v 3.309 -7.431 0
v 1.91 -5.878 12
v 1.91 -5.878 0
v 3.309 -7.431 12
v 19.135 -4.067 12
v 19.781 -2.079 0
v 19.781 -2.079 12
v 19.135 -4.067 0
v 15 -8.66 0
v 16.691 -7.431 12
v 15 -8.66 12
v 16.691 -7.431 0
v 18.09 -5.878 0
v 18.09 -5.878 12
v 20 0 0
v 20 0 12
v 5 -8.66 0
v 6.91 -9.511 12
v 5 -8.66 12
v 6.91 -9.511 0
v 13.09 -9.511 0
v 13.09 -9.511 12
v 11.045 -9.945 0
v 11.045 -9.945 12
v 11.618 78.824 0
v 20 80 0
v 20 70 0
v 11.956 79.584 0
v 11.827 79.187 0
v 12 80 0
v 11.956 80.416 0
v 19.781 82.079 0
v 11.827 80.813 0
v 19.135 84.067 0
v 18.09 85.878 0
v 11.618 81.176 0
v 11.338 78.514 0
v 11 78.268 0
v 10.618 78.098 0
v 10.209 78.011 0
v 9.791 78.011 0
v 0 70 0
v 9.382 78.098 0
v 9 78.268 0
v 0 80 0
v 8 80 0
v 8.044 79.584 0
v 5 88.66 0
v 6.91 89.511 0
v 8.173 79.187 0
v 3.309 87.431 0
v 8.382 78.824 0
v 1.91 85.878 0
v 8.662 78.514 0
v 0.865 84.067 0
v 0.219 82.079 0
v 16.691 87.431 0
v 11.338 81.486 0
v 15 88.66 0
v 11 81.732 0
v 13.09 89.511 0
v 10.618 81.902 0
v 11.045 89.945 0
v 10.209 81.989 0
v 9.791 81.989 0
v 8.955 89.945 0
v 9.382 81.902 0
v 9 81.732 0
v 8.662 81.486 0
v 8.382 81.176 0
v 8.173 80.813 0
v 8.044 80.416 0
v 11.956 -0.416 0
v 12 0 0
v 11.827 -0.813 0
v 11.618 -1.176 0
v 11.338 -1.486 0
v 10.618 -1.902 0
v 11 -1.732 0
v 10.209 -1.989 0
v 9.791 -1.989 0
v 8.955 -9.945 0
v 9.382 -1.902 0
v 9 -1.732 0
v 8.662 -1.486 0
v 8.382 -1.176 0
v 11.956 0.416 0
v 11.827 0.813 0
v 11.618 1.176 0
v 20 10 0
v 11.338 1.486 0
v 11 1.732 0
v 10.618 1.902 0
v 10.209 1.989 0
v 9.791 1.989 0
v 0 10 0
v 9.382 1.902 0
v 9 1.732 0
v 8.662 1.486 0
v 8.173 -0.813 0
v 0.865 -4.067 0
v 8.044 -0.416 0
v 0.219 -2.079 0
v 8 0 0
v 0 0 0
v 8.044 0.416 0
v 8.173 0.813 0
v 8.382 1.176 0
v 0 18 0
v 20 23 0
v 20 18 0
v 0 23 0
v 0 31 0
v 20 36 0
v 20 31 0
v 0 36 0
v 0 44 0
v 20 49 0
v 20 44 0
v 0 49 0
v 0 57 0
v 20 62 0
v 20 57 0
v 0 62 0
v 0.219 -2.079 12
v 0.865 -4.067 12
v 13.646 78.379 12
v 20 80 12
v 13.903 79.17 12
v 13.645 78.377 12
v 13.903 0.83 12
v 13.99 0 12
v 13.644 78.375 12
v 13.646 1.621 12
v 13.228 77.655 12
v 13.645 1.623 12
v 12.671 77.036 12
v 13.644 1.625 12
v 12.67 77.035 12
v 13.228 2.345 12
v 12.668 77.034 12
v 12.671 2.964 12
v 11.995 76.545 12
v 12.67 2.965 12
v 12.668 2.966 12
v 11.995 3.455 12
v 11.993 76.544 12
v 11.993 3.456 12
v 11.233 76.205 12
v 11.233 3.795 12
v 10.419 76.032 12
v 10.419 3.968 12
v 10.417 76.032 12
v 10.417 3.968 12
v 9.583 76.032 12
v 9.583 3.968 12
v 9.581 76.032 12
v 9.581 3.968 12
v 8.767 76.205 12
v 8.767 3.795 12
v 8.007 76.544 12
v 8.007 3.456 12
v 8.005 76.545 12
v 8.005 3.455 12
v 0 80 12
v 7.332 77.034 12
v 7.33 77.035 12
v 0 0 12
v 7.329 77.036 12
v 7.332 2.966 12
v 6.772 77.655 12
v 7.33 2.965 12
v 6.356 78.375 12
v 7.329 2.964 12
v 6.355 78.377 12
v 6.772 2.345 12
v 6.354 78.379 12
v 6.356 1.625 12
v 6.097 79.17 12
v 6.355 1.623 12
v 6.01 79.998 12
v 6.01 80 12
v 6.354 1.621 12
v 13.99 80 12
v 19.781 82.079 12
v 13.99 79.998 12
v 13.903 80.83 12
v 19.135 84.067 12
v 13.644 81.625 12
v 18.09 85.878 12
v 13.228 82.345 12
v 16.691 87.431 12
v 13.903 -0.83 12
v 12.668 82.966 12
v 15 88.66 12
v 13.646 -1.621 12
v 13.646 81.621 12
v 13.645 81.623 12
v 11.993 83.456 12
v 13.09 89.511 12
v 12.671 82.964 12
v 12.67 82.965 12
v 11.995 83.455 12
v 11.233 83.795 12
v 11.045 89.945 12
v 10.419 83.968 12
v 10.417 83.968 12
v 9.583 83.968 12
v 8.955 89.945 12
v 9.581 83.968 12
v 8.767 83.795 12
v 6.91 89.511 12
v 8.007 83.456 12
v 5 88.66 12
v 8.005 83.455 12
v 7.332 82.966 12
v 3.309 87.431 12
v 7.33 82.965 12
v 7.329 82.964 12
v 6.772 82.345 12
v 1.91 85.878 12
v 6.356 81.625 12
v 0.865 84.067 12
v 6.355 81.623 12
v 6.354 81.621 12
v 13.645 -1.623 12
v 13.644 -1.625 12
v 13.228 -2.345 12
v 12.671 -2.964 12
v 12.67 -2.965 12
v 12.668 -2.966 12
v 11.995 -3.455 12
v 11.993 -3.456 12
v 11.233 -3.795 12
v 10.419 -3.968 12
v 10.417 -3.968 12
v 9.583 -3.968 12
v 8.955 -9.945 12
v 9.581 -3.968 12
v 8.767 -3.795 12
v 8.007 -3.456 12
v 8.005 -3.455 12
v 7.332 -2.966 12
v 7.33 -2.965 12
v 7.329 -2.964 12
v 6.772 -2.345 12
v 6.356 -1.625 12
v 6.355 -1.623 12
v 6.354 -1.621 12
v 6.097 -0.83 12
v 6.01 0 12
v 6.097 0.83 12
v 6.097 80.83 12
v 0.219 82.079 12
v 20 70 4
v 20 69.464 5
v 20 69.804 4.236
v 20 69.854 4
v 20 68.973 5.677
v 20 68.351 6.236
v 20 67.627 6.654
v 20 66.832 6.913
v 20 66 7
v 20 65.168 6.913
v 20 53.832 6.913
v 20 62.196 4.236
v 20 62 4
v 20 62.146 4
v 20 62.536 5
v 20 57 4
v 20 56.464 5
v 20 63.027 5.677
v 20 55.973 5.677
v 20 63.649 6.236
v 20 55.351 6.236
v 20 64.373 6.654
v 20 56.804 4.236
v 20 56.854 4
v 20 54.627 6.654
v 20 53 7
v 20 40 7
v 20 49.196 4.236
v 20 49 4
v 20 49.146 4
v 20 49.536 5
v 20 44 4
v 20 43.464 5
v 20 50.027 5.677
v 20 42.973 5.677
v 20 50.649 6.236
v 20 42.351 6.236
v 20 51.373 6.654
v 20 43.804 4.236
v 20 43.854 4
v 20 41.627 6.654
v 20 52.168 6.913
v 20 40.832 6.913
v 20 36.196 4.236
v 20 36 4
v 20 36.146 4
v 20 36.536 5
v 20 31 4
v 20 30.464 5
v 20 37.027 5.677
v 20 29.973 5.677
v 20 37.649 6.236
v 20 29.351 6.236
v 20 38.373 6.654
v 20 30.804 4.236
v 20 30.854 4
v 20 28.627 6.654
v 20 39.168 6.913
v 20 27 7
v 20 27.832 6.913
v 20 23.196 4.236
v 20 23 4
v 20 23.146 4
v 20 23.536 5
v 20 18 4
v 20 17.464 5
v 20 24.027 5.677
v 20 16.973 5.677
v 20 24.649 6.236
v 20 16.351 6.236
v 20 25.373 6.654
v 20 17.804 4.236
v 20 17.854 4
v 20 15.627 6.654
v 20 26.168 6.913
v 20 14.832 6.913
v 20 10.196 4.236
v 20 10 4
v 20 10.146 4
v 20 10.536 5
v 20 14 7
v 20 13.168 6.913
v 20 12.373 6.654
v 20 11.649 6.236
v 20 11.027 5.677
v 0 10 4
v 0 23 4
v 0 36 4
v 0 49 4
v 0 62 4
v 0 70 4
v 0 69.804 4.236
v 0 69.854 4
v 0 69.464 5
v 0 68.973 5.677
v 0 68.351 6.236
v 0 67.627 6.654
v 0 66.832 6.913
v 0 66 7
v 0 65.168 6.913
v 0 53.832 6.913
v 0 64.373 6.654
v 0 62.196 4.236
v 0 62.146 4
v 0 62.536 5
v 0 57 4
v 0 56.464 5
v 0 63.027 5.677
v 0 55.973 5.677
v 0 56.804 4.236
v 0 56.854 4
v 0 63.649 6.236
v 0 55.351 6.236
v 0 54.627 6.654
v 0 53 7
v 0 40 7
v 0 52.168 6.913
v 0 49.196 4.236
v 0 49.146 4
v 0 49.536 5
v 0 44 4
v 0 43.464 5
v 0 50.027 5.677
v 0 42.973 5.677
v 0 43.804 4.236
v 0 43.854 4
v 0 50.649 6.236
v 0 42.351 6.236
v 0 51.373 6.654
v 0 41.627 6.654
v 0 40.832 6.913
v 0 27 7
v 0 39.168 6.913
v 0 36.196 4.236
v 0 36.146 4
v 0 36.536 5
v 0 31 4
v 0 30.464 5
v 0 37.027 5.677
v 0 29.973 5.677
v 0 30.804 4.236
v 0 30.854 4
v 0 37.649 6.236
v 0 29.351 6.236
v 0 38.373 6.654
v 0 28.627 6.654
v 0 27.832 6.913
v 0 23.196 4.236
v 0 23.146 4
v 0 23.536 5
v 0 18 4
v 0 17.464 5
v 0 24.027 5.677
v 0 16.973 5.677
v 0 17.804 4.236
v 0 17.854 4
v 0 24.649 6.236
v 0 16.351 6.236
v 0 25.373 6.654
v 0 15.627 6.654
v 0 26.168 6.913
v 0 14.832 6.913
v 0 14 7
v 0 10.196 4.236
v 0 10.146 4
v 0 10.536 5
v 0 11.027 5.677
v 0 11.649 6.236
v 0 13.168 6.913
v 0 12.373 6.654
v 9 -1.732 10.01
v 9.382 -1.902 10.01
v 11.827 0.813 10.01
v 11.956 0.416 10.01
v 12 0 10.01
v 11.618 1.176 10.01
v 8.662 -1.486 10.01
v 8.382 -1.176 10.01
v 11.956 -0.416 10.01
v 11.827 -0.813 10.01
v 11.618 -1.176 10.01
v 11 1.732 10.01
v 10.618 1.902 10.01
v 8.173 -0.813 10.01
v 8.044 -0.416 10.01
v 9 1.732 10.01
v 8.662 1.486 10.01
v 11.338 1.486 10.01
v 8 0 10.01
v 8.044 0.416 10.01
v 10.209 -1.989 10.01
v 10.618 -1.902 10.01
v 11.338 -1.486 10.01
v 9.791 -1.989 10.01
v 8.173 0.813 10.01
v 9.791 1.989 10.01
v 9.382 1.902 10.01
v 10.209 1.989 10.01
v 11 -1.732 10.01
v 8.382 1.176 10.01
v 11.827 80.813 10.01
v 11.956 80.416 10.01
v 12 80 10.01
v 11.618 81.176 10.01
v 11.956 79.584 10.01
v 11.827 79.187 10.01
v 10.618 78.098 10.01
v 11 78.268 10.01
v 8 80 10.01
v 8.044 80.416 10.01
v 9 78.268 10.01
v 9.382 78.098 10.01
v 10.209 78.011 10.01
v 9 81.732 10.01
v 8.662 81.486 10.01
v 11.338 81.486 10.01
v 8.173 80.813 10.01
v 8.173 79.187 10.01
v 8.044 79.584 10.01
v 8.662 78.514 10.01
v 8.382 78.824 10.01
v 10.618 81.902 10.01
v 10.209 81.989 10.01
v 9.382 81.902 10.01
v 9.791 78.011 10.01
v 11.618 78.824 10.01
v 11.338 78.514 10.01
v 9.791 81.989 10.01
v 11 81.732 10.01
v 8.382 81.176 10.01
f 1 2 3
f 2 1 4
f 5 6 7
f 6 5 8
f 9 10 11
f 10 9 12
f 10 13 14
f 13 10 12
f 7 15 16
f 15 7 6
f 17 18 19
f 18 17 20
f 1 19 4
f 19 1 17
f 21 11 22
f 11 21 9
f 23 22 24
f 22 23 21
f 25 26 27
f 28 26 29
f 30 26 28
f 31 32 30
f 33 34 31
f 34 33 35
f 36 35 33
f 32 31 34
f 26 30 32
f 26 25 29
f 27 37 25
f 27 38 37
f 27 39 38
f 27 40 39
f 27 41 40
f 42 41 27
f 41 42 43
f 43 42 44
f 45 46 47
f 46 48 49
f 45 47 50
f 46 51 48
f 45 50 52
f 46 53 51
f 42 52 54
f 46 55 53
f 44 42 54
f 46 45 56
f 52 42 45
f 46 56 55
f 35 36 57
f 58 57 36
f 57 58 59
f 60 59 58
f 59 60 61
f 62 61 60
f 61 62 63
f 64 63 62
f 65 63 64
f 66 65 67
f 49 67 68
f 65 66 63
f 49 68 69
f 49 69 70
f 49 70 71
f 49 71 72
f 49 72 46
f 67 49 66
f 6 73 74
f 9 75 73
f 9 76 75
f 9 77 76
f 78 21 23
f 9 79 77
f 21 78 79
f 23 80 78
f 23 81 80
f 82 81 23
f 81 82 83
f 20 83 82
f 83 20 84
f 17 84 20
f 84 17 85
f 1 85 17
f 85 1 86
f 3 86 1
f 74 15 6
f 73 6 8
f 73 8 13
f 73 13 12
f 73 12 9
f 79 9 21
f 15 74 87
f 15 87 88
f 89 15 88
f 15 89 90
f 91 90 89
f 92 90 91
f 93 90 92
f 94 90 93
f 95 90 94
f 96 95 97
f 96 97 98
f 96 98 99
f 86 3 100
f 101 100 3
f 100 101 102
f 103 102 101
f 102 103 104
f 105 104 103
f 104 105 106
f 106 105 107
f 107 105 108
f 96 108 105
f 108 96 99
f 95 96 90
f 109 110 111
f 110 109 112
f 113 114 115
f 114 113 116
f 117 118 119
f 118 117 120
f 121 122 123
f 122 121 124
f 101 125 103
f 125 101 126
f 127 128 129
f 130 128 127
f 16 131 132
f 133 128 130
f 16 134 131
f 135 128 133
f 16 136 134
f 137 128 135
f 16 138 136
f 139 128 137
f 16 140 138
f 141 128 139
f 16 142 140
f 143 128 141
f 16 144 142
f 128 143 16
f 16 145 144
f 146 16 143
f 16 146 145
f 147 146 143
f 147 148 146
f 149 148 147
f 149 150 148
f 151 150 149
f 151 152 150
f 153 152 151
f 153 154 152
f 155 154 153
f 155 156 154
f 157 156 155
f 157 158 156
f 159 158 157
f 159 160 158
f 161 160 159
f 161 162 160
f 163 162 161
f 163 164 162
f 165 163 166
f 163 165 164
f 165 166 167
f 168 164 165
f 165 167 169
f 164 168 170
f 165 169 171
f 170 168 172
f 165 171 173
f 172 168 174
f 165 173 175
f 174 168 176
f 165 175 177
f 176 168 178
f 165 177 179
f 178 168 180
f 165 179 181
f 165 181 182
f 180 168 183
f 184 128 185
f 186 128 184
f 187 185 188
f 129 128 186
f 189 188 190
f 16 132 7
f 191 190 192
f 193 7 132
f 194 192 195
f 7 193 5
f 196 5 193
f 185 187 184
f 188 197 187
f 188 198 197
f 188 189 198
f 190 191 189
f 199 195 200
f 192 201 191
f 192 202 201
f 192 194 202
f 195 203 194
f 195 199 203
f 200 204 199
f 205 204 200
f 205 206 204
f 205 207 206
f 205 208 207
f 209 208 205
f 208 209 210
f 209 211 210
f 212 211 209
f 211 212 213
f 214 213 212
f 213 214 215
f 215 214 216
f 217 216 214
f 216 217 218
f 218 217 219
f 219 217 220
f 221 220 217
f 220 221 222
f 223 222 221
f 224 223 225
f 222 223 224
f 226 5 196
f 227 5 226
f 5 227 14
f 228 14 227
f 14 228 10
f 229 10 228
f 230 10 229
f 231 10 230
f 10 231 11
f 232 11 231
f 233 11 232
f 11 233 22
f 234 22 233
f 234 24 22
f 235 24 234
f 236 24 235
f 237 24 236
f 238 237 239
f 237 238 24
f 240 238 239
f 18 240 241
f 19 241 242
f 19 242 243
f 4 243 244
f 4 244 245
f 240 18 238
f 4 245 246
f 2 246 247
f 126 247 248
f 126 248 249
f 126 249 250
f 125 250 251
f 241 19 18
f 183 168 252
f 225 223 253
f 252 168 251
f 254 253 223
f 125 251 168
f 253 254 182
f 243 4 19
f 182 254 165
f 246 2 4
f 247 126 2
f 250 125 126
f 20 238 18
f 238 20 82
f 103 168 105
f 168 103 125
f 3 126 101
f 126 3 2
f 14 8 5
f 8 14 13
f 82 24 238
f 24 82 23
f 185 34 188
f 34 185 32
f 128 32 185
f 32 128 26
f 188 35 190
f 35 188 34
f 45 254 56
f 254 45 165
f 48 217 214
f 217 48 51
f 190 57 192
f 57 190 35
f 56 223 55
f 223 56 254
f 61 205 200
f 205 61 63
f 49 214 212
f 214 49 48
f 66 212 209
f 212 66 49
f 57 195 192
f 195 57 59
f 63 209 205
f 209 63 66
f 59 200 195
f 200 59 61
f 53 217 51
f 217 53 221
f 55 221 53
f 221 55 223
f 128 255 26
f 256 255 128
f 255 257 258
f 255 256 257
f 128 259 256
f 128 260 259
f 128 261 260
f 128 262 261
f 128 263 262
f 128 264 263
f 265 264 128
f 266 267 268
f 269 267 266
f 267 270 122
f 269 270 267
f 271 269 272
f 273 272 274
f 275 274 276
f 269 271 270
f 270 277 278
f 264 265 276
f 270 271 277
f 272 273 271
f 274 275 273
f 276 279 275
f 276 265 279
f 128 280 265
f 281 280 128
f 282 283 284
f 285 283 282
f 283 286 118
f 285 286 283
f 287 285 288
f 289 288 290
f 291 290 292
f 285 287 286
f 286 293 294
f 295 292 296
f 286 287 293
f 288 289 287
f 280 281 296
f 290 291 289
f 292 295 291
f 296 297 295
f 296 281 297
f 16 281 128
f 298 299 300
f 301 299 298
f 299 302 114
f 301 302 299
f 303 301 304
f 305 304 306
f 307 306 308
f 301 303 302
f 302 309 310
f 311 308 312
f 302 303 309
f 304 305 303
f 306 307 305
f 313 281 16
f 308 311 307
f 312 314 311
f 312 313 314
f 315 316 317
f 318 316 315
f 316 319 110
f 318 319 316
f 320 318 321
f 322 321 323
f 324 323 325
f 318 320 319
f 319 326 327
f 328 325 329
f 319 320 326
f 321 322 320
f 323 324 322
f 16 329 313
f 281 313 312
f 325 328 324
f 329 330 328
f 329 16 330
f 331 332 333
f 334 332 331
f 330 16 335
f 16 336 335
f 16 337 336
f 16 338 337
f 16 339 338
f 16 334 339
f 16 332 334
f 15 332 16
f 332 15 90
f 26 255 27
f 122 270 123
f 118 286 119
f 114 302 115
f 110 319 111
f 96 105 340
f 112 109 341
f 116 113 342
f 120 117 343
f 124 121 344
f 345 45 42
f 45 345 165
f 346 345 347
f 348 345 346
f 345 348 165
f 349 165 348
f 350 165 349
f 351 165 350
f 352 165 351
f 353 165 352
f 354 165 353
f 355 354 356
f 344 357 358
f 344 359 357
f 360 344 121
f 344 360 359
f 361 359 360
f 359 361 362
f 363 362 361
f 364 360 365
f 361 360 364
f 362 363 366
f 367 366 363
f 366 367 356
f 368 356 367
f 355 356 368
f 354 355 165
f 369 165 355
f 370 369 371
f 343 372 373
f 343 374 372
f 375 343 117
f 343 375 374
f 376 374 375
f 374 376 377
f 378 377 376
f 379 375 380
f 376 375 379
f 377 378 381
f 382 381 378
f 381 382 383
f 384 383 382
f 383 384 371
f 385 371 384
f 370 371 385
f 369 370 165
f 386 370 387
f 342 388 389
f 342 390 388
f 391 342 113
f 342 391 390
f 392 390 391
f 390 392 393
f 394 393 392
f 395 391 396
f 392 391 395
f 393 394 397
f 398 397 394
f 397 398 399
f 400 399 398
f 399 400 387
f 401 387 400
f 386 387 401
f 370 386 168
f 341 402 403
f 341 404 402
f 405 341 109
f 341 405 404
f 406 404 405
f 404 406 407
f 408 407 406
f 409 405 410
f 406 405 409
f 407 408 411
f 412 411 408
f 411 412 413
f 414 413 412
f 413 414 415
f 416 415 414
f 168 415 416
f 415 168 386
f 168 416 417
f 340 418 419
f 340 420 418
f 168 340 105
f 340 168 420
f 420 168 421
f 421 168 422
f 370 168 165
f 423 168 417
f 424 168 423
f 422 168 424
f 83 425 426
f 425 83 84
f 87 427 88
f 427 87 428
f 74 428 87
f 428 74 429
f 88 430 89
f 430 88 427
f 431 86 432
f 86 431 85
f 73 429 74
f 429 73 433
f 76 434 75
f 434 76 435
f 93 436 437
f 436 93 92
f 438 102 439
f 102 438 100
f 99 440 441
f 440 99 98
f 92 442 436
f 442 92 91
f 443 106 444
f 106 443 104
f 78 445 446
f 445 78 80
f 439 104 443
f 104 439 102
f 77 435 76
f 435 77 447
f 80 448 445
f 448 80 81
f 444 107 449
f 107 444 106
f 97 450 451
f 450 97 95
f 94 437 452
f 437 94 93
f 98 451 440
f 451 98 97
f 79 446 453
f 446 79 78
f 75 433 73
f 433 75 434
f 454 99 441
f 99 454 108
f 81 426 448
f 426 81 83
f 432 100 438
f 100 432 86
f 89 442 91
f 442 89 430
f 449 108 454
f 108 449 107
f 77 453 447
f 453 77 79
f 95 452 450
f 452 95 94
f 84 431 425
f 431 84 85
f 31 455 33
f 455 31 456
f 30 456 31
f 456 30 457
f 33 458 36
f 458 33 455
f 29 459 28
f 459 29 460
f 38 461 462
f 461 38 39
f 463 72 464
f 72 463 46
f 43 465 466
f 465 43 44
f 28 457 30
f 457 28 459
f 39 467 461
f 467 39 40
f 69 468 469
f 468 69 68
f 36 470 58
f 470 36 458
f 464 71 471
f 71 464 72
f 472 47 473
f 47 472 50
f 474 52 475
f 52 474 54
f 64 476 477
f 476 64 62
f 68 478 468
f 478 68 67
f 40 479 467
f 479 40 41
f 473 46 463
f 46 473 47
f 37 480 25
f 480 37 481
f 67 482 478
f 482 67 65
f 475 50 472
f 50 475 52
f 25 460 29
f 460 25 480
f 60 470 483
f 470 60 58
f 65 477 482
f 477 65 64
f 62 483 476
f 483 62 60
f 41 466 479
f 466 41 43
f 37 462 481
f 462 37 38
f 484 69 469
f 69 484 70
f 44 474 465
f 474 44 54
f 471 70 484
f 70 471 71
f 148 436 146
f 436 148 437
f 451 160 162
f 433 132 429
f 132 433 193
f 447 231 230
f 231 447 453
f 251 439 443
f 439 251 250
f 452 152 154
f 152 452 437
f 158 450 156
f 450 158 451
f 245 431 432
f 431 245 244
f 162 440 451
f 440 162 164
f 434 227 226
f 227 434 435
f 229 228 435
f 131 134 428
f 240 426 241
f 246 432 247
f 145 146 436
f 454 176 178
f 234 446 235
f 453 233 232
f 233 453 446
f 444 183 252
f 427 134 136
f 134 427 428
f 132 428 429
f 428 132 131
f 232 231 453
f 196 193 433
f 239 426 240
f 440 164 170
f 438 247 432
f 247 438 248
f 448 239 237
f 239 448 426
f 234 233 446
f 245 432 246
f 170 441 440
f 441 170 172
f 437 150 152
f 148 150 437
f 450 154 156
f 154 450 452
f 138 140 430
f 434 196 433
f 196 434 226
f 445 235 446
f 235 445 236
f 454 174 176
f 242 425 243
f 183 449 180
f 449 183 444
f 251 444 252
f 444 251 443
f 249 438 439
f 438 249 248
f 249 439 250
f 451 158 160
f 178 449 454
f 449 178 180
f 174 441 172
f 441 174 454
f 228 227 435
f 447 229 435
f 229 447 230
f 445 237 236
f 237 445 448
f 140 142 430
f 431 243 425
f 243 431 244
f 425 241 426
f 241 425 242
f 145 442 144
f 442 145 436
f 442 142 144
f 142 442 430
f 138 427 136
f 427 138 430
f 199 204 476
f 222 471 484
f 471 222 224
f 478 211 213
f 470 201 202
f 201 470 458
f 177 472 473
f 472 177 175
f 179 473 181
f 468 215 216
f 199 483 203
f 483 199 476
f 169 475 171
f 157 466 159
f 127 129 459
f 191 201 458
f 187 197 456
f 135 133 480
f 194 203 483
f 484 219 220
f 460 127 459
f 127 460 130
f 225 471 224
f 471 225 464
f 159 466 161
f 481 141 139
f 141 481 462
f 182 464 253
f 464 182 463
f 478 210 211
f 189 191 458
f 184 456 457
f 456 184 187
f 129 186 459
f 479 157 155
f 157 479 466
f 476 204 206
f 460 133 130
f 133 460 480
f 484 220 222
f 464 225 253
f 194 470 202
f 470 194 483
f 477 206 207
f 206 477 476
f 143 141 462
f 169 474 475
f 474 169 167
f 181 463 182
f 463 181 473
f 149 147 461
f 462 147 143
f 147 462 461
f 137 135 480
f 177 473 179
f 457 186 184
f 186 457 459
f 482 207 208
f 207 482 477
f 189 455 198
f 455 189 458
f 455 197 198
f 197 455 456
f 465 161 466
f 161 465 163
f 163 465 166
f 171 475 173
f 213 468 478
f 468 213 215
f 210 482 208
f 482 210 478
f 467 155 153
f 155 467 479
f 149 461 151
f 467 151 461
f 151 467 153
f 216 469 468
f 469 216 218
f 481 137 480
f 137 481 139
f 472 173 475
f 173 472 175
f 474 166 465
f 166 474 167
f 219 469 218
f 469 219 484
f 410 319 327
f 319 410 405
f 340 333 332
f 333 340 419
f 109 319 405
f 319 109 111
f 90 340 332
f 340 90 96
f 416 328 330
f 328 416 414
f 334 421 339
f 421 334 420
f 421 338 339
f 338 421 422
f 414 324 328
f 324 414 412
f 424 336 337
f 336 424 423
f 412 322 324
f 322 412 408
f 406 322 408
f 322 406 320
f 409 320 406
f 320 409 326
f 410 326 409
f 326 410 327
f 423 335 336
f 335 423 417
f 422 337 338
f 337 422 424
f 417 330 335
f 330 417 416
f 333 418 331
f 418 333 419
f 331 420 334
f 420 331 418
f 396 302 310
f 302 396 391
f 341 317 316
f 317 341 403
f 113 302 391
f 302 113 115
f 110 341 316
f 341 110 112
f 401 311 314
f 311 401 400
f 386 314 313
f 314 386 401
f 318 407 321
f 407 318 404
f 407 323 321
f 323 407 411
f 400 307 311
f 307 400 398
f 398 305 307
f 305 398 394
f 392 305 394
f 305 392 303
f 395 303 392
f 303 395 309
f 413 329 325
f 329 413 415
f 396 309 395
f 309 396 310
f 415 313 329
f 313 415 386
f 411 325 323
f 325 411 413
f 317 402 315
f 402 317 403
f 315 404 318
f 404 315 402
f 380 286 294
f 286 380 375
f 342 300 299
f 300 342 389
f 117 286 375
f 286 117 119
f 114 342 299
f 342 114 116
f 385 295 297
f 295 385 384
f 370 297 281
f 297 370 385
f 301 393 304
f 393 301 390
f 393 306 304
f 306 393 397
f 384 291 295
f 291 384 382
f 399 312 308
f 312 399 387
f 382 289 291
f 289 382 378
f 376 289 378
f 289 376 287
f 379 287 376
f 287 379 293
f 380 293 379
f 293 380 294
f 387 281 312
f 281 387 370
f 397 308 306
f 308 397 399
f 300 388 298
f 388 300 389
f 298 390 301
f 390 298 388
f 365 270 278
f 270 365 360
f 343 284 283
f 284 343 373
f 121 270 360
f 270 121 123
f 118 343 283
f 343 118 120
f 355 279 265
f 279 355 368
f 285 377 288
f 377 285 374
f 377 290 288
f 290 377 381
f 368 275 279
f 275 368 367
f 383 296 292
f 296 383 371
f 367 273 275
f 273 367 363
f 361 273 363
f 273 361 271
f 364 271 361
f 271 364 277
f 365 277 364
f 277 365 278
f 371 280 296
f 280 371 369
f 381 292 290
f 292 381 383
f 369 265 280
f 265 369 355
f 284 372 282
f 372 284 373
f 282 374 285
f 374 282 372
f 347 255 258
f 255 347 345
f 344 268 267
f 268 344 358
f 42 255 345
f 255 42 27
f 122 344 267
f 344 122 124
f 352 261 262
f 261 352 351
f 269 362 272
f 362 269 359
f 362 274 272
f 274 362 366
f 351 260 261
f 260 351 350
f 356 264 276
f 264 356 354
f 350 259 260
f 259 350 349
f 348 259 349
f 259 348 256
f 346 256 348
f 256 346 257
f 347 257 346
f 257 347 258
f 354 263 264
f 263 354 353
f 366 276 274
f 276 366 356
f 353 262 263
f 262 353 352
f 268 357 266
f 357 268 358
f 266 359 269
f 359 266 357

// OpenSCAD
//Resolution of the curves.(Higher = more polygons and higher load time)
$fn = 30;
//What would you like the width to be?(mm)
widthOfBody     = 20;
//What would you like the height to be?(mm)
heightOfBody    = 12;
//How many slots do you want?(int)
numberOfSlots   = 5;
//How wide should the slots be?(mm)
widthOfSlots    = 8;
//How wide should the screw hole be?(mm)
widthOfScrew    = 4;
//How wide do you want the seperating walls?(mm)
widthOfWalls    = 5;

lengthOfBody    = (widthOfBody) + ( widthOfSlots * numberOfSlots ) + ( widthOfWalls * ( numberOfSlots - 1 ) );
difference(){
    union(){
        cube([widthOfBody, lengthOfBody, heightOfBody]);
        translate([ widthOfBody / 2, 0, 0]){
            cylinder( d = widthOfBody, h = heightOfBody );
            translate([ 0, lengthOfBody, 0]){
                cylinder( d = widthOfBody, h = heightOfBody );
            }
        }
    }
    union(){
        translate([ widthOfBody / 2, 0, -1 ]){
            cylinder( d = widthOfScrew, h = heightOfBody + 2 );
            translate([ 0, lengthOfBody, 0]){
                cylinder( d = widthOfScrew, h = heightOfBody + 2 );
            }
        }
        translate([ widthOfBody / 2, 0, heightOfBody - ( heightOfBody / 6 ) + 0.01]){
            cylinder( d1 = widthOfScrew, d2 = widthOfScrew * 2, h = ( heightOfBody / 6 ) );
            translate([ 0, lengthOfBody, 0]){
                cylinder( d1 = widthOfScrew, d2 = widthOfScrew * 2, h = 2 );
            }
        }
        for( i = [ 1 : numberOfSlots ] ){
            translate([-1, ( ( widthOfBody / 2 ) ) + ( ( i - 1 ) * widthOfWalls ) + ( ( i - 1) * widthOfSlots ),-1]){
                cube( [ 2 + widthOfBody, widthOfSlots, 1 + ( widthOfSlots / 2 ) ] );
                
                translate([0, widthOfSlots / 2, widthOfSlots / 2 ]){
                    rotate( a = [ 0, 90, 0 ] ){
                        cylinder( d = widthOfSlots, h = 2 + widthOfBody );
                    }
                }
            }
        }
    }
}
